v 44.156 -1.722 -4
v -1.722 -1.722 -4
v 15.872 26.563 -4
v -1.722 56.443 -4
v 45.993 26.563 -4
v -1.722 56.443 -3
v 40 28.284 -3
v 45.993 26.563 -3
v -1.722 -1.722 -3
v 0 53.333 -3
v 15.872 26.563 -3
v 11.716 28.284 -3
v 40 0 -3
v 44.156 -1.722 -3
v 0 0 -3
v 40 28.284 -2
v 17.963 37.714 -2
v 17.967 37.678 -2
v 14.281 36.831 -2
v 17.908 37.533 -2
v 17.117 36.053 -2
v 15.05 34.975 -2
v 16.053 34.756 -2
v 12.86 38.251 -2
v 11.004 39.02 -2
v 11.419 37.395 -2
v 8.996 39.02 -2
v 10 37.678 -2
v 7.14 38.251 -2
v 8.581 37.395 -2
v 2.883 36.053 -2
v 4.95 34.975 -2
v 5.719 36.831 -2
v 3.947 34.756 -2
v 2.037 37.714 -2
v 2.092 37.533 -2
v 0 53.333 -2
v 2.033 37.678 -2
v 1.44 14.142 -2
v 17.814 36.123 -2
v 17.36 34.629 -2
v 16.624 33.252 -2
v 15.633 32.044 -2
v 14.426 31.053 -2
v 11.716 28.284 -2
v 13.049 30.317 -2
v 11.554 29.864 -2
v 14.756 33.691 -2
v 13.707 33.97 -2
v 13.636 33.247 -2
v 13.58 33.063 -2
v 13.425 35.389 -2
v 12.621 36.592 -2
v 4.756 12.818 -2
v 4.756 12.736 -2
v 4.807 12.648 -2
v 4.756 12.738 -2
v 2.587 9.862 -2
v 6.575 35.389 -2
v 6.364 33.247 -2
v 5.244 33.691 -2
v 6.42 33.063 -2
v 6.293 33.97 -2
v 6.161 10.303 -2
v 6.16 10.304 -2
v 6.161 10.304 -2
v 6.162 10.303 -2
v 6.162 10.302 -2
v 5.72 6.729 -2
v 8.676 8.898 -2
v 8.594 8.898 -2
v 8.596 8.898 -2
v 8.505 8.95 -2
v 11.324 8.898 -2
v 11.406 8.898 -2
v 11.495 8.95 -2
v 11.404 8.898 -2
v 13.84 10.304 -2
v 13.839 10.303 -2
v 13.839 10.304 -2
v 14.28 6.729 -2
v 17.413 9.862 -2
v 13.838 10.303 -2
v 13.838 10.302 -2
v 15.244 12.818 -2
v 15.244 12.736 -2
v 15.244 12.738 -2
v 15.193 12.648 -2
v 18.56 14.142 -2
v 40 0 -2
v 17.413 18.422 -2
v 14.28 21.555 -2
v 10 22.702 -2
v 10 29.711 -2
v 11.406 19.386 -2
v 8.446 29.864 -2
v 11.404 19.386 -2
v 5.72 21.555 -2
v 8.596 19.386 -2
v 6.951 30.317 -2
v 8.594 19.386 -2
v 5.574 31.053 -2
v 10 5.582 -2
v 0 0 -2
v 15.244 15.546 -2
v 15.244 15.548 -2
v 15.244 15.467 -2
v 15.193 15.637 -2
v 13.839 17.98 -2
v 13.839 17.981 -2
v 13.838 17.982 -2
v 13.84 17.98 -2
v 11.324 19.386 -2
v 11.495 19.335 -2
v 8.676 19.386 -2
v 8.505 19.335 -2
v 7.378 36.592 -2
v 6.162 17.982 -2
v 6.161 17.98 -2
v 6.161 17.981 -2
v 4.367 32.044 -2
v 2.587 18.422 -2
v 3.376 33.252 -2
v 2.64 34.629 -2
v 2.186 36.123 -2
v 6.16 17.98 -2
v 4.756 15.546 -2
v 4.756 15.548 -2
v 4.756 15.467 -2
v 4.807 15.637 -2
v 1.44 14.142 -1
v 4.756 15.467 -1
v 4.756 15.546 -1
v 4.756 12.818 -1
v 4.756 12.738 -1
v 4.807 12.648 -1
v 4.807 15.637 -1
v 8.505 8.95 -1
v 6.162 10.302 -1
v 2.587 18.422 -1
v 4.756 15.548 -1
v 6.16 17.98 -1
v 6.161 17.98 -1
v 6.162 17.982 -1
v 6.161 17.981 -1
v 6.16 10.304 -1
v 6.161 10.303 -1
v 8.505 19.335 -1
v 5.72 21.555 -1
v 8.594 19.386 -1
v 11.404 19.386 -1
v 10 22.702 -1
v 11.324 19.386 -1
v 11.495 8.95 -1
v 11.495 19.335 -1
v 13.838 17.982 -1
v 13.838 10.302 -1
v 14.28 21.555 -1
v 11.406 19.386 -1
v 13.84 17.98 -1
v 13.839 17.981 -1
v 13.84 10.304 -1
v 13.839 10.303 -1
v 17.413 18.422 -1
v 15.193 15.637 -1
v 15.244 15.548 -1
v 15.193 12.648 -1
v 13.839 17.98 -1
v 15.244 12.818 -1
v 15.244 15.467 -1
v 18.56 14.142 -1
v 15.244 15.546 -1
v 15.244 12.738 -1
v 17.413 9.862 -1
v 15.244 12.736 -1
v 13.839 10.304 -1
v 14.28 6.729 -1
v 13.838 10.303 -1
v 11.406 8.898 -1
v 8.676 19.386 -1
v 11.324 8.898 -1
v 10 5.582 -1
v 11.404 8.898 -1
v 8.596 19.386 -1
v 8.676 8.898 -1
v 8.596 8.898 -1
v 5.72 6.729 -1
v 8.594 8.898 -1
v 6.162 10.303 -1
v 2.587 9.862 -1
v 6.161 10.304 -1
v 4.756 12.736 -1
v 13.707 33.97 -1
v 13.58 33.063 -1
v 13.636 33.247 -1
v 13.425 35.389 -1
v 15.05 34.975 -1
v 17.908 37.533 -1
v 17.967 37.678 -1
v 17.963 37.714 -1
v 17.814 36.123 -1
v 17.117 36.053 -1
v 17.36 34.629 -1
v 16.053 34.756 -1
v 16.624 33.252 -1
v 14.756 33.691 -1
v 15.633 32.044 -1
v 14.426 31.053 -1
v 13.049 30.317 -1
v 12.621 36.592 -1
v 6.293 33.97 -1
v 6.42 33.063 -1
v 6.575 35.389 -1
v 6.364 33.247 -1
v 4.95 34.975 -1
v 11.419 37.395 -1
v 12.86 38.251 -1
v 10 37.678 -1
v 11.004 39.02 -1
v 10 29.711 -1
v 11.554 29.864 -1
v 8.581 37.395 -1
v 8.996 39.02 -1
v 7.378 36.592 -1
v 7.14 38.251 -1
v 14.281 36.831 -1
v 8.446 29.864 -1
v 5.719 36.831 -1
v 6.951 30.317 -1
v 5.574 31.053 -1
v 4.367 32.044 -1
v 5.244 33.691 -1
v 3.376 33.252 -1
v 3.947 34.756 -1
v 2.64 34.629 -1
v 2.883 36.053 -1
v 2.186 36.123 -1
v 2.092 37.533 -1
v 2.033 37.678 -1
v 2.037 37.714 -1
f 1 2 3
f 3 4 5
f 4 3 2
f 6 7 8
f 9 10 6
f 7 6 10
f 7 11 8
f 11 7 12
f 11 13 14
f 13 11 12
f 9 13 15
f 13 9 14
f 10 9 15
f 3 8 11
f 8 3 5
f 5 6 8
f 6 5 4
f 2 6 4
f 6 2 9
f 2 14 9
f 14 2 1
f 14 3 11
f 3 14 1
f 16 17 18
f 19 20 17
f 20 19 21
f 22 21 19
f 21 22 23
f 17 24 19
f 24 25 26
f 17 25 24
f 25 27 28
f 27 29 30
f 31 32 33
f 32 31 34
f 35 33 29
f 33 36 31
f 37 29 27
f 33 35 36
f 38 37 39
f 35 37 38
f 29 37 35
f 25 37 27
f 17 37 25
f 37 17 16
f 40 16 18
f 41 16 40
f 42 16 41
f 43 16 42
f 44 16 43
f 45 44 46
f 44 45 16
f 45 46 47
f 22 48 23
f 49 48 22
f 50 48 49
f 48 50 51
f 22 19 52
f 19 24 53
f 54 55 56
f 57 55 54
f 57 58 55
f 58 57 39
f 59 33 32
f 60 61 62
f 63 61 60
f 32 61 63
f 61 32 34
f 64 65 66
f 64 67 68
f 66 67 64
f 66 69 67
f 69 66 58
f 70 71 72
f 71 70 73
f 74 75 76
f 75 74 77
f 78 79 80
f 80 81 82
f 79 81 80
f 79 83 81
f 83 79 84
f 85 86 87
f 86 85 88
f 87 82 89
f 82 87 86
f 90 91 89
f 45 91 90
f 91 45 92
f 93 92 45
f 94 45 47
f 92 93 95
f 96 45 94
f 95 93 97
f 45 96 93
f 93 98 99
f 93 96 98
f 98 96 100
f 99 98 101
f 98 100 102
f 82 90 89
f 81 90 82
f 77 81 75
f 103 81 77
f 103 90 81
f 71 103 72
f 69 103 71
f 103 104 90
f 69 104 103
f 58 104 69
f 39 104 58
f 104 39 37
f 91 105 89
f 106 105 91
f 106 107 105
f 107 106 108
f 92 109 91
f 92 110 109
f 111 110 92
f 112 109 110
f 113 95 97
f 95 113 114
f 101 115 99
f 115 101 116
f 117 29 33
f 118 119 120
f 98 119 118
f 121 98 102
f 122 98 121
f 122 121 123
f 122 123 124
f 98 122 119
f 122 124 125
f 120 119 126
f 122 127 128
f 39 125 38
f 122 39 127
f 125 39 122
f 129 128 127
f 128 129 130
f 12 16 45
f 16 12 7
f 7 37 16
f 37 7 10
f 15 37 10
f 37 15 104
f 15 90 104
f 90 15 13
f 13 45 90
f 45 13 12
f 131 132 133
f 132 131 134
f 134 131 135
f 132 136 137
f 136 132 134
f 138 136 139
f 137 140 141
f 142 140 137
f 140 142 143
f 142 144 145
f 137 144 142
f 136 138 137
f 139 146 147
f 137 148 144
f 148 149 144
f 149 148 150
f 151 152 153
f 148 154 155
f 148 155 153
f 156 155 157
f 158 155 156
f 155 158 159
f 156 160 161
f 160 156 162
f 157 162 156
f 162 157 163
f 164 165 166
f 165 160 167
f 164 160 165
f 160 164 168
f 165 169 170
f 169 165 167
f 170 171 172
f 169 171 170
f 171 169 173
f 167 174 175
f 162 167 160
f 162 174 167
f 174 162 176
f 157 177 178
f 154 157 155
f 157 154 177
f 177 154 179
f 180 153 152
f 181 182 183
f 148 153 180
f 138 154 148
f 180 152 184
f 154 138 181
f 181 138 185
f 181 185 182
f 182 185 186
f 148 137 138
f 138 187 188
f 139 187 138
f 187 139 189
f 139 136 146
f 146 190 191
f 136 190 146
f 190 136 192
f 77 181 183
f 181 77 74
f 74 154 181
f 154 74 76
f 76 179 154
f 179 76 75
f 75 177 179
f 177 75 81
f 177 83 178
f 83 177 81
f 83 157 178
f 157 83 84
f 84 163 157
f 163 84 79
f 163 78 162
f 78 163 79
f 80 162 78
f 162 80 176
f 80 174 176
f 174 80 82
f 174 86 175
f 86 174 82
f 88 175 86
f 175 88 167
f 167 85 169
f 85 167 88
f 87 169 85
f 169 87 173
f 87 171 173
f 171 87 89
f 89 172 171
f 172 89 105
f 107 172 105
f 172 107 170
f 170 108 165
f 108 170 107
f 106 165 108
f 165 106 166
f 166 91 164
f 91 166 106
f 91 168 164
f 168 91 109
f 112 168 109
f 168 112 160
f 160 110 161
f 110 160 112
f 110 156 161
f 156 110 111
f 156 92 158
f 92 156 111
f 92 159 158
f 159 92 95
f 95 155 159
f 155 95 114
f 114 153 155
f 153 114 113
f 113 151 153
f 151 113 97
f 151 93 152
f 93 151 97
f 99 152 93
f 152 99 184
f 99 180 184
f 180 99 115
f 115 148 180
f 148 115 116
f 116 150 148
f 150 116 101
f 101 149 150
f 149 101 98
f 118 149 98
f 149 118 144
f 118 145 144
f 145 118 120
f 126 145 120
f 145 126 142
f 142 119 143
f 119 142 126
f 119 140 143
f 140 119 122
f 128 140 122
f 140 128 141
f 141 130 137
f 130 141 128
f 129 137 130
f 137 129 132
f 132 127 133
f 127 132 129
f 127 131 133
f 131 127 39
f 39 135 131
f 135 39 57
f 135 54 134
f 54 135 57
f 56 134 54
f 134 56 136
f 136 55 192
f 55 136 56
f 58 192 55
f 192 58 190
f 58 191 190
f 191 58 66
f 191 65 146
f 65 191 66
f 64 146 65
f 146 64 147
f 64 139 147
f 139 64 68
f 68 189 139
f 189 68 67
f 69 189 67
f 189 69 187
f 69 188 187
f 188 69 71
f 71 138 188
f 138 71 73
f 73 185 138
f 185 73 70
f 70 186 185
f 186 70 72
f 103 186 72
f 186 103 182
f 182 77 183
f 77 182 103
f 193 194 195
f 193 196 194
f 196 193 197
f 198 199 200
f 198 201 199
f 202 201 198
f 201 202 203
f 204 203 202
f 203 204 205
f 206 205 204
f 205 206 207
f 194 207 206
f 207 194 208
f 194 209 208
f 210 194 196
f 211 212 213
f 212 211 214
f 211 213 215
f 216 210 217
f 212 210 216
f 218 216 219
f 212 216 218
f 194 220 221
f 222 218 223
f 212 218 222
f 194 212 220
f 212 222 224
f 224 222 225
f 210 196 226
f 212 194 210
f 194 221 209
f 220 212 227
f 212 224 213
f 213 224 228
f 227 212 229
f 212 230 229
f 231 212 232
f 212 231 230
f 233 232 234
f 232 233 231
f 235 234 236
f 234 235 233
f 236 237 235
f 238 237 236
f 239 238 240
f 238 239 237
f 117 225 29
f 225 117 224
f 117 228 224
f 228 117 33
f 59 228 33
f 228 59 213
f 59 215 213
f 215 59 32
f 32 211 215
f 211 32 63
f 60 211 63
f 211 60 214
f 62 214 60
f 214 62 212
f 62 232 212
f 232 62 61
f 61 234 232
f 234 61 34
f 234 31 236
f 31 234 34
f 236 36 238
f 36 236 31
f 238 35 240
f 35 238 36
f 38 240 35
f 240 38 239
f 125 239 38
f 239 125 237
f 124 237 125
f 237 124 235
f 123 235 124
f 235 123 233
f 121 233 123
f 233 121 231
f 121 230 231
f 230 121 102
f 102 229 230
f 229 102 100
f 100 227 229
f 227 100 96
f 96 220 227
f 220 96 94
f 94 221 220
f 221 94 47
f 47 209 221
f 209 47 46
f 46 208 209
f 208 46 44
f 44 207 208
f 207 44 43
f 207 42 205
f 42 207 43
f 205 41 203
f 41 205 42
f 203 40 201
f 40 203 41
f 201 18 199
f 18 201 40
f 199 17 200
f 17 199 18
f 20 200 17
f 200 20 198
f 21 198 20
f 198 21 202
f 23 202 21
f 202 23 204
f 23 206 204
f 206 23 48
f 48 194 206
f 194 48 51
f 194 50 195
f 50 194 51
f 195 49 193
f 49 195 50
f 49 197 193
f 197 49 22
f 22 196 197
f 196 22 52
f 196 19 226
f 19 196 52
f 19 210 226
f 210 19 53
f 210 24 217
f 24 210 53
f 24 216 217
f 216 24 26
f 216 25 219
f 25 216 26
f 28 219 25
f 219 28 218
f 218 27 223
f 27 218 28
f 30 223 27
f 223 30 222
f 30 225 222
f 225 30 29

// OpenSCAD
// file: vec3math.scad
function dx(v, n) = [n, 0, 0] + v;

function dy(v, n) = [0, n, 0] + v;

function dz(v, n) = [0, 0, n] + v;

function mx(v) = [-v.x, v.y, v.z];

function my(v) = [v.x, -v.y, v.z];

function mz(v) = [v.x, v.y, -v.z];

function rx(v, n) = (
  [[1, 0, 0], [0, cos(n), -sin(n)], [0, sin(n), cos(n)]]*v
);

function ry(v, n) = (
  [[cos(n), 0, sin(n)], [0, 1, 0], [-sin(n), 0, cos(n)]]*v
);

function rz(v, n) = (
  [[cos(n), -sin(n), 0], [sin(n), cos(n), 0], [0, 0, 1]]*v
);

function sx(v, n) = [n*v.x, v.y, v.z];

function sy(v, n) = [v.x, n*v.y, v.z];

function sz(v, n) = [v.x, v.y, n*v.z];

function skewxy(v, n) = [[1, n, 0], [0, 1, 0], [0, 0, 1]]*v;

function skewxz(v, n) = [[1, 0, n], [0, 1, 0], [0, 0, 1]]*v;

function skewyx(v, n) = [[1, 0, 0], [n, 1, 0], [0, 0, 1]]*v;

function skewyz(v, n) = [[1, 0, 0], [0, 1, n], [0, 0, 1]]*v;

function skewzx(v, n) = [[1, 0, 0], [0, 1, 0], [n, 0, 1]]*v;

function skewzy(v, n) = [[1, 0, 0], [0, 1, 0], [0, n, 1]]*v;
// file: handyfunctions.scad
module dx(n) {
  translate([n, 0, 0]) children();
}

module dy(n) {
  translate([0, n, 0]) children();
}

module dz(n) {
  translate([0, 0, n]) children();
}

module mx() {
  mirror([1, 0, 0]) children();
}

module my() {
  mirror([0, 1, 0]) children();
}

module mz() {
  mirror([0, 0, 1]) children();
}

module rx(n) {
  rotate([n, 0, 0]) children();
}

module ry(n) {
  rotate([0, n, 0]) children();
}

module rz(n) {
  rotate([0, 0, n]) children();
}

module sx(n) {
  scale([n, 1, 1]) children();
}

module sy(n) {
  scale([1, n, 1]) children();
}

module sz(n) {
  scale([1, 1, n]) children();
}

module skewxy(n) {
  multmatrix(m = [[1, n, 0, 0], [0, 1, 0, 0], [0, 0, 1, 0]]) children();
}

module skewxz(n) {
  multmatrix(m = [[1, 0, n, 0], [0, 1, 0, 0], [0, 0, 1, 0]]) children();
}

module skewyx(n) {
  multmatrix(m = [[1, 0, 0, 0], [n, 1, 0, 0], [0, 0, 1, 0]]) children();
}

module skewyz(n) {
  multmatrix(m = [[1, 0, 0, 0], [0, 1, n, 0], [0, 0, 1, 0]]) children();
}

module skewzx(n) {
  multmatrix(m = [[1, 0, 0, 0], [0, 1, 0, 0], [n, 0, 1, 0]]) children();
}

module skewzy(n) {
  multmatrix(m = [[1, 0, 0, 0], [0, 1, 0, 0], [0, n, 1, 0]]) children();
}

module xy() {
  dz(1e3) cube(center=true, 2e3);
}

module xz() {
  dy(1e3) cube(center=true, 2e3);
}

module yz() {
  dx(1e3) cube(center=true, 2e3);
}
// main file
// OpenSCADvent flag of Nepal
// Space Buck, December 2020

use <handyfunctions.scad>
use <vec3math.scad>


$fn=32;

// A function to find the intersection of two line segments (assume line segments lie on the xy plane and do intersect)
function intersect(p0, p1, q0, q1) =
  let (r = p1 - p0)
  let (s = q1 - q0)
  let (t = norm(cross(q0-p0, s)) / norm(cross(s, r)))
  p0 + t*r;

// A function to project a point onto a line segment (assume point and line segment lie on xy plane)
function project(p, q0, q1) = 
  let (orthog = rz(q1-q0, 90))
  intersect(p, p+orthog, q0, q1);

// Square function
function sq(x) = pow(x, 2);

// A function to find the two points where a line segment intersects a circle (assume line segment and circle lie on XY plane, and that line segment creates a chord on the circle)
function chord(p, r, q0, q1) =
  let (s = q1 - q0)
  let (a = sq(s.x) + sq(s.y))
  let (b = 2*q0.x*s.x + 2*q0.y*s.y - 2*p.x*s.x - 2*p.y*s.y)
  let (c = sq(p.x) - 2*p.x*q0.x + sq(q0.x) + sq(p.y) - 2*p.y*q0.y + sq(q0.y) - sq(r))
  let (t = (-b + sqrt(sq(b) - 4*a*c))/(2*a))
  let (u = (-b - sqrt(sq(b) - 4*a*c))/(2*a))
  [q0 + t*s, q0 + u*s];

// A function to find the two points where two circles intersect (assume circles lie on XY plane and have two intersections)
function twoCircles(p0, r0, p1, r1) =
  let (slope = -(p0.x - p1.x)/(p0.y - p1.y))
  let (int = (-(sq(r0) - sq(r1)) + (sq(p0.x) - sq(p1.x)) + (sq(p0.y) - sq(p1.y)))/(2*(p0.y - p1.y)))
  let (a = 1 + sq(slope))
  let (b = -2*p0.x - 2*slope*p0.y + 2*slope*int)
  let (c = sq(p0.x) + sq(p0.y) - 2*int*p0.y + sq(int) - sq(r0))
  let (x0 = (-b + sqrt(sq(b) - 4*a*c))/(2*a))
  let (x1 = (-b - sqrt(sq(b) - 4*a*c))/(2*a))
  let (y0 = slope*x0 + int)
  let (y1 = slope*x1 + int)
  [[x0, y0, 0], [x1, y1, 0]];




// Schedule-1 National Flag of Nepal
// (a) Method of making the shape inside the border
// (1) On the lower portion of a crimson cloth draw a line AB of the required length from left to right.
A = [0, 0, 0];
B = [40, 0, 0];
AB = B - A;

// (2) From A draw a line AC perpendicular to AB making AC equal to AB plus one third AB. From AC mark off D making line AD equal to line AB. Join B and D.
AC = rz(AB*4/3, 90);
C = A + AC;
AD = rz(AB, 90);
D = A + AD;
BD = D - B;

// (3) From BD mark off E making BE equal to AB.
E = B + norm(AB)*BD/norm(BD);

// (4) Touching E draw a line FG, starting from the point F on line AC, parallel to AB to the right hand-side. Mark off FG equal to AB.
F = intersect(E-AB, E, A, C);
FG = AB;
G = F + FG;

// (5) Join C and G.
CG = G - C;
module insideBorder() {
  polygon([[A[0], A[1]], [B[0], B[1]], [E[0], E[1]], [G[0], G[1]], [C[0], C[1]]]);
}

// (b) Method of making the moon
// (6) From AB mark off AH making AH equal to one-fourth of line AB and starting from H draw a line HI parallel to line AC touching line CG at point I.
H = A + 1/4*AB;
I = intersect(H, H+AC, C, G);
HI = I - H;

// (7) Bisect CF at J and draw a line JK parallel to AB touching CG at point K.
CF = F - C;
J = C + 1/2*CF;
K = intersect(J, J+AB, C, G);
JK = K - J;

// (8) Let L be the point where lines JK and HI cut one another.
L = intersect(J, K, H, I);

// (9) Join J and G.
JG = G - J;

// (10) Let M be the point where line JG and HI cut one another.
M = intersect(J, G, H, I);

// (11) With centre M and with a distance shortest from M to BD mark off N on the lower portion of line HI.
Nprime = project(M, B, D);
MN = -1*norm(M-Nprime)*HI/norm(HI);
N = M + MN;

// (12) Touching M and starting from O, a point on AC, draw a line from left to right parallel to AB.
O = intersect(A, C, M, M+AB);

// (13) With centre L and radius LN draw a semi-circle on the lower portion and let P and Q be the points where it touches the line OM respectively.
LN = N - L;
module semicircle1() {
  translate(L) circle(r=norm(LN));
}
PandQ = chord(L, norm(LN), M, O);
P = PandQ[0];
Q = PandQ[1];

// (14) With centre M and radius MQ draw a semi-circle on the lower portion touching P and Q.
MQ = Q - M;
module semicircle2() {
  translate(M) circle(r=norm(MQ));
}

// (15) With centre N and radius NM draw an arc touching PNQ at R and S. Join RS. Let T be the point where RS and HI cut one another.
NM = M - N;
RandS = twoCircles(N, norm(NM), L, norm(LN));
R = RandS[0];
S = RandS[1];
T = intersect(R, S, H, I);

// (16) With centre T and radius TS draw a semi-circle on the upper portion of PNQ touching it at two points.
TS = S - T;
module semicircle3() {
  translate(T) circle(r=norm(TS));
}


// (17) With centre T and radius TM draw an arc on the upper portion of PNQ touching at two points.
TM = M - T;
module semicircle4() {
  translate(T) circle(r=norm(TM));
}

// (18) Eight equal and similar triangles of the moon are to be made in the space lying inside the semi-circle of No. (16) and outside the arc of No. (17) of this Schedule.
TR = R - T;
module moonRay() {
  ray0 = norm(TM)*TR/norm(TR);
  ray1 = rz(TR, 180/16);
  ray2 = rz(ray0, 2*180/16);
  polygon([[ray0[0], ray0[1]], [ray1[0], ray1[1]], [ray2[0], ray2[1]]]);
}

module moonRayPrime() {
  ray0 = rz(norm(TM)*TR/norm(TR), -180/14);
  ray1 = TR;
  ray2 = rz(norm(TM)*TR/norm(TR), 180/14);
  polygon([[ray0[0], ray0[1]], [ray1[0], ray1[1]], [ray2[0], ray2[1]]]);
}

module moon() {
  difference() {
    semicircle2();
    semicircle1();
  }
  intersection() {
    semicircle4();
    semicircle1();
  }
  for (i = [0:7]) {
    *translate(T) rz(i*2*180/14) moonRayPrime();
    translate(T) rz(i*2*180/16) moonRay();
  }
  *for (i = [-1:8]) {
    translate(T) rz(i*2*180/16) moonRay();
  }
}

module ambiguousZone() {
  intersection() {
    semicircle1();
    difference() {
      semicircle3();
      semicircle4();
    }
  }
}

// (c) Method of making the sun
// (19) Bisect line AF at U, and draw a line UV parallel to AB line touching line BE at V.
AF = F - A;
U = A + 1/2*AF;
V = intersect(U, U+AB, B, E);

// (20) With centre W, the point where HI and UV cut one another and radius MN draw a circle.
W = intersect(H, I, U, V);
module sun1() {
  translate(W) circle(r = norm(MN));
}

// (21) With centre W and radius LN draw a circle.
module sun2() {
  translate(W) circle(r = norm(LN));
}

// (22) Twelve equal and similar triangles of the sun are to be made in the space enclosed by the circles of No. (20) and of No. (21) with the two apexes of two triangles touching line HI.
module sunRay() {
  // Note: I use 179.9 degrees instead of 180 degrees here to avoid a nonmanifold issue when rendering
  ray0 = norm(LN)*HI/norm(HI);
  ray1 = rz(norm(MN)*HI/norm(HI), -179.9/12);
  ray2 = rz(norm(MN)*HI/norm(HI), 179.9/12);
  polygon([[ray0[0], ray0[1]], [ray1[0], ray1[1]], [ray2[0], ray2[1]]]);
}
module sun() {
  union() {
    sun1();
    for (i = [0:11]) {
      translate(W) rz(i*360/12) sunRay();
    }
  }
}

// (d) Method of making the border
// (23) The width of the border will be equal to the width TN. This will be of deep blue colour and will be provided on all the side of the flag. However, on the five angles of the flag the external angles will be equal to the internal angles.
TN = N - T;
module border() {
  offset(delta=norm(TN)) insideBorder();
}

// (24) The above mentioned border will be provided if the flag is to be used with a rope. On the other hand, if it is to be hoisted on a pole, the hole on the border on the side AC can be extended according to requirements.
//
// Explanation: The lines HI, RS, FE, ED, JG, OQ, JK and UV are imaginary. Similarly, the external and internal circles of the sun and the other arcs except the crescent moon are also imaginary. These are not shown on the flag.

module showPoints() {
  alphabet = ["A","B","C","D","E","F","G","H","I","J","K","L","M","N","O","P","Q","R","S","T","U","V","W"];
  points = [A, B, C, D, E, F, G, H, I, J, K, L, M, N, O, P, Q, R, S, T, U, V, W];

  for (i = [0:22]) {
    point = points[i];
    letter = alphabet[i];
    color("black") translate(point) sphere(.2);
    translate(point) dx(-1.5) linear_extrude(.1) text(letter, size=1);
  }
}

*showPoints();
color("blue") dz(-4) linear_extrude(1) border();
color("red") dz(-3) linear_extrude(1) insideBorder();
color("white") dz(-2) linear_extrude(1) sun();
color("white") dz(-2) linear_extrude(1) moon();
